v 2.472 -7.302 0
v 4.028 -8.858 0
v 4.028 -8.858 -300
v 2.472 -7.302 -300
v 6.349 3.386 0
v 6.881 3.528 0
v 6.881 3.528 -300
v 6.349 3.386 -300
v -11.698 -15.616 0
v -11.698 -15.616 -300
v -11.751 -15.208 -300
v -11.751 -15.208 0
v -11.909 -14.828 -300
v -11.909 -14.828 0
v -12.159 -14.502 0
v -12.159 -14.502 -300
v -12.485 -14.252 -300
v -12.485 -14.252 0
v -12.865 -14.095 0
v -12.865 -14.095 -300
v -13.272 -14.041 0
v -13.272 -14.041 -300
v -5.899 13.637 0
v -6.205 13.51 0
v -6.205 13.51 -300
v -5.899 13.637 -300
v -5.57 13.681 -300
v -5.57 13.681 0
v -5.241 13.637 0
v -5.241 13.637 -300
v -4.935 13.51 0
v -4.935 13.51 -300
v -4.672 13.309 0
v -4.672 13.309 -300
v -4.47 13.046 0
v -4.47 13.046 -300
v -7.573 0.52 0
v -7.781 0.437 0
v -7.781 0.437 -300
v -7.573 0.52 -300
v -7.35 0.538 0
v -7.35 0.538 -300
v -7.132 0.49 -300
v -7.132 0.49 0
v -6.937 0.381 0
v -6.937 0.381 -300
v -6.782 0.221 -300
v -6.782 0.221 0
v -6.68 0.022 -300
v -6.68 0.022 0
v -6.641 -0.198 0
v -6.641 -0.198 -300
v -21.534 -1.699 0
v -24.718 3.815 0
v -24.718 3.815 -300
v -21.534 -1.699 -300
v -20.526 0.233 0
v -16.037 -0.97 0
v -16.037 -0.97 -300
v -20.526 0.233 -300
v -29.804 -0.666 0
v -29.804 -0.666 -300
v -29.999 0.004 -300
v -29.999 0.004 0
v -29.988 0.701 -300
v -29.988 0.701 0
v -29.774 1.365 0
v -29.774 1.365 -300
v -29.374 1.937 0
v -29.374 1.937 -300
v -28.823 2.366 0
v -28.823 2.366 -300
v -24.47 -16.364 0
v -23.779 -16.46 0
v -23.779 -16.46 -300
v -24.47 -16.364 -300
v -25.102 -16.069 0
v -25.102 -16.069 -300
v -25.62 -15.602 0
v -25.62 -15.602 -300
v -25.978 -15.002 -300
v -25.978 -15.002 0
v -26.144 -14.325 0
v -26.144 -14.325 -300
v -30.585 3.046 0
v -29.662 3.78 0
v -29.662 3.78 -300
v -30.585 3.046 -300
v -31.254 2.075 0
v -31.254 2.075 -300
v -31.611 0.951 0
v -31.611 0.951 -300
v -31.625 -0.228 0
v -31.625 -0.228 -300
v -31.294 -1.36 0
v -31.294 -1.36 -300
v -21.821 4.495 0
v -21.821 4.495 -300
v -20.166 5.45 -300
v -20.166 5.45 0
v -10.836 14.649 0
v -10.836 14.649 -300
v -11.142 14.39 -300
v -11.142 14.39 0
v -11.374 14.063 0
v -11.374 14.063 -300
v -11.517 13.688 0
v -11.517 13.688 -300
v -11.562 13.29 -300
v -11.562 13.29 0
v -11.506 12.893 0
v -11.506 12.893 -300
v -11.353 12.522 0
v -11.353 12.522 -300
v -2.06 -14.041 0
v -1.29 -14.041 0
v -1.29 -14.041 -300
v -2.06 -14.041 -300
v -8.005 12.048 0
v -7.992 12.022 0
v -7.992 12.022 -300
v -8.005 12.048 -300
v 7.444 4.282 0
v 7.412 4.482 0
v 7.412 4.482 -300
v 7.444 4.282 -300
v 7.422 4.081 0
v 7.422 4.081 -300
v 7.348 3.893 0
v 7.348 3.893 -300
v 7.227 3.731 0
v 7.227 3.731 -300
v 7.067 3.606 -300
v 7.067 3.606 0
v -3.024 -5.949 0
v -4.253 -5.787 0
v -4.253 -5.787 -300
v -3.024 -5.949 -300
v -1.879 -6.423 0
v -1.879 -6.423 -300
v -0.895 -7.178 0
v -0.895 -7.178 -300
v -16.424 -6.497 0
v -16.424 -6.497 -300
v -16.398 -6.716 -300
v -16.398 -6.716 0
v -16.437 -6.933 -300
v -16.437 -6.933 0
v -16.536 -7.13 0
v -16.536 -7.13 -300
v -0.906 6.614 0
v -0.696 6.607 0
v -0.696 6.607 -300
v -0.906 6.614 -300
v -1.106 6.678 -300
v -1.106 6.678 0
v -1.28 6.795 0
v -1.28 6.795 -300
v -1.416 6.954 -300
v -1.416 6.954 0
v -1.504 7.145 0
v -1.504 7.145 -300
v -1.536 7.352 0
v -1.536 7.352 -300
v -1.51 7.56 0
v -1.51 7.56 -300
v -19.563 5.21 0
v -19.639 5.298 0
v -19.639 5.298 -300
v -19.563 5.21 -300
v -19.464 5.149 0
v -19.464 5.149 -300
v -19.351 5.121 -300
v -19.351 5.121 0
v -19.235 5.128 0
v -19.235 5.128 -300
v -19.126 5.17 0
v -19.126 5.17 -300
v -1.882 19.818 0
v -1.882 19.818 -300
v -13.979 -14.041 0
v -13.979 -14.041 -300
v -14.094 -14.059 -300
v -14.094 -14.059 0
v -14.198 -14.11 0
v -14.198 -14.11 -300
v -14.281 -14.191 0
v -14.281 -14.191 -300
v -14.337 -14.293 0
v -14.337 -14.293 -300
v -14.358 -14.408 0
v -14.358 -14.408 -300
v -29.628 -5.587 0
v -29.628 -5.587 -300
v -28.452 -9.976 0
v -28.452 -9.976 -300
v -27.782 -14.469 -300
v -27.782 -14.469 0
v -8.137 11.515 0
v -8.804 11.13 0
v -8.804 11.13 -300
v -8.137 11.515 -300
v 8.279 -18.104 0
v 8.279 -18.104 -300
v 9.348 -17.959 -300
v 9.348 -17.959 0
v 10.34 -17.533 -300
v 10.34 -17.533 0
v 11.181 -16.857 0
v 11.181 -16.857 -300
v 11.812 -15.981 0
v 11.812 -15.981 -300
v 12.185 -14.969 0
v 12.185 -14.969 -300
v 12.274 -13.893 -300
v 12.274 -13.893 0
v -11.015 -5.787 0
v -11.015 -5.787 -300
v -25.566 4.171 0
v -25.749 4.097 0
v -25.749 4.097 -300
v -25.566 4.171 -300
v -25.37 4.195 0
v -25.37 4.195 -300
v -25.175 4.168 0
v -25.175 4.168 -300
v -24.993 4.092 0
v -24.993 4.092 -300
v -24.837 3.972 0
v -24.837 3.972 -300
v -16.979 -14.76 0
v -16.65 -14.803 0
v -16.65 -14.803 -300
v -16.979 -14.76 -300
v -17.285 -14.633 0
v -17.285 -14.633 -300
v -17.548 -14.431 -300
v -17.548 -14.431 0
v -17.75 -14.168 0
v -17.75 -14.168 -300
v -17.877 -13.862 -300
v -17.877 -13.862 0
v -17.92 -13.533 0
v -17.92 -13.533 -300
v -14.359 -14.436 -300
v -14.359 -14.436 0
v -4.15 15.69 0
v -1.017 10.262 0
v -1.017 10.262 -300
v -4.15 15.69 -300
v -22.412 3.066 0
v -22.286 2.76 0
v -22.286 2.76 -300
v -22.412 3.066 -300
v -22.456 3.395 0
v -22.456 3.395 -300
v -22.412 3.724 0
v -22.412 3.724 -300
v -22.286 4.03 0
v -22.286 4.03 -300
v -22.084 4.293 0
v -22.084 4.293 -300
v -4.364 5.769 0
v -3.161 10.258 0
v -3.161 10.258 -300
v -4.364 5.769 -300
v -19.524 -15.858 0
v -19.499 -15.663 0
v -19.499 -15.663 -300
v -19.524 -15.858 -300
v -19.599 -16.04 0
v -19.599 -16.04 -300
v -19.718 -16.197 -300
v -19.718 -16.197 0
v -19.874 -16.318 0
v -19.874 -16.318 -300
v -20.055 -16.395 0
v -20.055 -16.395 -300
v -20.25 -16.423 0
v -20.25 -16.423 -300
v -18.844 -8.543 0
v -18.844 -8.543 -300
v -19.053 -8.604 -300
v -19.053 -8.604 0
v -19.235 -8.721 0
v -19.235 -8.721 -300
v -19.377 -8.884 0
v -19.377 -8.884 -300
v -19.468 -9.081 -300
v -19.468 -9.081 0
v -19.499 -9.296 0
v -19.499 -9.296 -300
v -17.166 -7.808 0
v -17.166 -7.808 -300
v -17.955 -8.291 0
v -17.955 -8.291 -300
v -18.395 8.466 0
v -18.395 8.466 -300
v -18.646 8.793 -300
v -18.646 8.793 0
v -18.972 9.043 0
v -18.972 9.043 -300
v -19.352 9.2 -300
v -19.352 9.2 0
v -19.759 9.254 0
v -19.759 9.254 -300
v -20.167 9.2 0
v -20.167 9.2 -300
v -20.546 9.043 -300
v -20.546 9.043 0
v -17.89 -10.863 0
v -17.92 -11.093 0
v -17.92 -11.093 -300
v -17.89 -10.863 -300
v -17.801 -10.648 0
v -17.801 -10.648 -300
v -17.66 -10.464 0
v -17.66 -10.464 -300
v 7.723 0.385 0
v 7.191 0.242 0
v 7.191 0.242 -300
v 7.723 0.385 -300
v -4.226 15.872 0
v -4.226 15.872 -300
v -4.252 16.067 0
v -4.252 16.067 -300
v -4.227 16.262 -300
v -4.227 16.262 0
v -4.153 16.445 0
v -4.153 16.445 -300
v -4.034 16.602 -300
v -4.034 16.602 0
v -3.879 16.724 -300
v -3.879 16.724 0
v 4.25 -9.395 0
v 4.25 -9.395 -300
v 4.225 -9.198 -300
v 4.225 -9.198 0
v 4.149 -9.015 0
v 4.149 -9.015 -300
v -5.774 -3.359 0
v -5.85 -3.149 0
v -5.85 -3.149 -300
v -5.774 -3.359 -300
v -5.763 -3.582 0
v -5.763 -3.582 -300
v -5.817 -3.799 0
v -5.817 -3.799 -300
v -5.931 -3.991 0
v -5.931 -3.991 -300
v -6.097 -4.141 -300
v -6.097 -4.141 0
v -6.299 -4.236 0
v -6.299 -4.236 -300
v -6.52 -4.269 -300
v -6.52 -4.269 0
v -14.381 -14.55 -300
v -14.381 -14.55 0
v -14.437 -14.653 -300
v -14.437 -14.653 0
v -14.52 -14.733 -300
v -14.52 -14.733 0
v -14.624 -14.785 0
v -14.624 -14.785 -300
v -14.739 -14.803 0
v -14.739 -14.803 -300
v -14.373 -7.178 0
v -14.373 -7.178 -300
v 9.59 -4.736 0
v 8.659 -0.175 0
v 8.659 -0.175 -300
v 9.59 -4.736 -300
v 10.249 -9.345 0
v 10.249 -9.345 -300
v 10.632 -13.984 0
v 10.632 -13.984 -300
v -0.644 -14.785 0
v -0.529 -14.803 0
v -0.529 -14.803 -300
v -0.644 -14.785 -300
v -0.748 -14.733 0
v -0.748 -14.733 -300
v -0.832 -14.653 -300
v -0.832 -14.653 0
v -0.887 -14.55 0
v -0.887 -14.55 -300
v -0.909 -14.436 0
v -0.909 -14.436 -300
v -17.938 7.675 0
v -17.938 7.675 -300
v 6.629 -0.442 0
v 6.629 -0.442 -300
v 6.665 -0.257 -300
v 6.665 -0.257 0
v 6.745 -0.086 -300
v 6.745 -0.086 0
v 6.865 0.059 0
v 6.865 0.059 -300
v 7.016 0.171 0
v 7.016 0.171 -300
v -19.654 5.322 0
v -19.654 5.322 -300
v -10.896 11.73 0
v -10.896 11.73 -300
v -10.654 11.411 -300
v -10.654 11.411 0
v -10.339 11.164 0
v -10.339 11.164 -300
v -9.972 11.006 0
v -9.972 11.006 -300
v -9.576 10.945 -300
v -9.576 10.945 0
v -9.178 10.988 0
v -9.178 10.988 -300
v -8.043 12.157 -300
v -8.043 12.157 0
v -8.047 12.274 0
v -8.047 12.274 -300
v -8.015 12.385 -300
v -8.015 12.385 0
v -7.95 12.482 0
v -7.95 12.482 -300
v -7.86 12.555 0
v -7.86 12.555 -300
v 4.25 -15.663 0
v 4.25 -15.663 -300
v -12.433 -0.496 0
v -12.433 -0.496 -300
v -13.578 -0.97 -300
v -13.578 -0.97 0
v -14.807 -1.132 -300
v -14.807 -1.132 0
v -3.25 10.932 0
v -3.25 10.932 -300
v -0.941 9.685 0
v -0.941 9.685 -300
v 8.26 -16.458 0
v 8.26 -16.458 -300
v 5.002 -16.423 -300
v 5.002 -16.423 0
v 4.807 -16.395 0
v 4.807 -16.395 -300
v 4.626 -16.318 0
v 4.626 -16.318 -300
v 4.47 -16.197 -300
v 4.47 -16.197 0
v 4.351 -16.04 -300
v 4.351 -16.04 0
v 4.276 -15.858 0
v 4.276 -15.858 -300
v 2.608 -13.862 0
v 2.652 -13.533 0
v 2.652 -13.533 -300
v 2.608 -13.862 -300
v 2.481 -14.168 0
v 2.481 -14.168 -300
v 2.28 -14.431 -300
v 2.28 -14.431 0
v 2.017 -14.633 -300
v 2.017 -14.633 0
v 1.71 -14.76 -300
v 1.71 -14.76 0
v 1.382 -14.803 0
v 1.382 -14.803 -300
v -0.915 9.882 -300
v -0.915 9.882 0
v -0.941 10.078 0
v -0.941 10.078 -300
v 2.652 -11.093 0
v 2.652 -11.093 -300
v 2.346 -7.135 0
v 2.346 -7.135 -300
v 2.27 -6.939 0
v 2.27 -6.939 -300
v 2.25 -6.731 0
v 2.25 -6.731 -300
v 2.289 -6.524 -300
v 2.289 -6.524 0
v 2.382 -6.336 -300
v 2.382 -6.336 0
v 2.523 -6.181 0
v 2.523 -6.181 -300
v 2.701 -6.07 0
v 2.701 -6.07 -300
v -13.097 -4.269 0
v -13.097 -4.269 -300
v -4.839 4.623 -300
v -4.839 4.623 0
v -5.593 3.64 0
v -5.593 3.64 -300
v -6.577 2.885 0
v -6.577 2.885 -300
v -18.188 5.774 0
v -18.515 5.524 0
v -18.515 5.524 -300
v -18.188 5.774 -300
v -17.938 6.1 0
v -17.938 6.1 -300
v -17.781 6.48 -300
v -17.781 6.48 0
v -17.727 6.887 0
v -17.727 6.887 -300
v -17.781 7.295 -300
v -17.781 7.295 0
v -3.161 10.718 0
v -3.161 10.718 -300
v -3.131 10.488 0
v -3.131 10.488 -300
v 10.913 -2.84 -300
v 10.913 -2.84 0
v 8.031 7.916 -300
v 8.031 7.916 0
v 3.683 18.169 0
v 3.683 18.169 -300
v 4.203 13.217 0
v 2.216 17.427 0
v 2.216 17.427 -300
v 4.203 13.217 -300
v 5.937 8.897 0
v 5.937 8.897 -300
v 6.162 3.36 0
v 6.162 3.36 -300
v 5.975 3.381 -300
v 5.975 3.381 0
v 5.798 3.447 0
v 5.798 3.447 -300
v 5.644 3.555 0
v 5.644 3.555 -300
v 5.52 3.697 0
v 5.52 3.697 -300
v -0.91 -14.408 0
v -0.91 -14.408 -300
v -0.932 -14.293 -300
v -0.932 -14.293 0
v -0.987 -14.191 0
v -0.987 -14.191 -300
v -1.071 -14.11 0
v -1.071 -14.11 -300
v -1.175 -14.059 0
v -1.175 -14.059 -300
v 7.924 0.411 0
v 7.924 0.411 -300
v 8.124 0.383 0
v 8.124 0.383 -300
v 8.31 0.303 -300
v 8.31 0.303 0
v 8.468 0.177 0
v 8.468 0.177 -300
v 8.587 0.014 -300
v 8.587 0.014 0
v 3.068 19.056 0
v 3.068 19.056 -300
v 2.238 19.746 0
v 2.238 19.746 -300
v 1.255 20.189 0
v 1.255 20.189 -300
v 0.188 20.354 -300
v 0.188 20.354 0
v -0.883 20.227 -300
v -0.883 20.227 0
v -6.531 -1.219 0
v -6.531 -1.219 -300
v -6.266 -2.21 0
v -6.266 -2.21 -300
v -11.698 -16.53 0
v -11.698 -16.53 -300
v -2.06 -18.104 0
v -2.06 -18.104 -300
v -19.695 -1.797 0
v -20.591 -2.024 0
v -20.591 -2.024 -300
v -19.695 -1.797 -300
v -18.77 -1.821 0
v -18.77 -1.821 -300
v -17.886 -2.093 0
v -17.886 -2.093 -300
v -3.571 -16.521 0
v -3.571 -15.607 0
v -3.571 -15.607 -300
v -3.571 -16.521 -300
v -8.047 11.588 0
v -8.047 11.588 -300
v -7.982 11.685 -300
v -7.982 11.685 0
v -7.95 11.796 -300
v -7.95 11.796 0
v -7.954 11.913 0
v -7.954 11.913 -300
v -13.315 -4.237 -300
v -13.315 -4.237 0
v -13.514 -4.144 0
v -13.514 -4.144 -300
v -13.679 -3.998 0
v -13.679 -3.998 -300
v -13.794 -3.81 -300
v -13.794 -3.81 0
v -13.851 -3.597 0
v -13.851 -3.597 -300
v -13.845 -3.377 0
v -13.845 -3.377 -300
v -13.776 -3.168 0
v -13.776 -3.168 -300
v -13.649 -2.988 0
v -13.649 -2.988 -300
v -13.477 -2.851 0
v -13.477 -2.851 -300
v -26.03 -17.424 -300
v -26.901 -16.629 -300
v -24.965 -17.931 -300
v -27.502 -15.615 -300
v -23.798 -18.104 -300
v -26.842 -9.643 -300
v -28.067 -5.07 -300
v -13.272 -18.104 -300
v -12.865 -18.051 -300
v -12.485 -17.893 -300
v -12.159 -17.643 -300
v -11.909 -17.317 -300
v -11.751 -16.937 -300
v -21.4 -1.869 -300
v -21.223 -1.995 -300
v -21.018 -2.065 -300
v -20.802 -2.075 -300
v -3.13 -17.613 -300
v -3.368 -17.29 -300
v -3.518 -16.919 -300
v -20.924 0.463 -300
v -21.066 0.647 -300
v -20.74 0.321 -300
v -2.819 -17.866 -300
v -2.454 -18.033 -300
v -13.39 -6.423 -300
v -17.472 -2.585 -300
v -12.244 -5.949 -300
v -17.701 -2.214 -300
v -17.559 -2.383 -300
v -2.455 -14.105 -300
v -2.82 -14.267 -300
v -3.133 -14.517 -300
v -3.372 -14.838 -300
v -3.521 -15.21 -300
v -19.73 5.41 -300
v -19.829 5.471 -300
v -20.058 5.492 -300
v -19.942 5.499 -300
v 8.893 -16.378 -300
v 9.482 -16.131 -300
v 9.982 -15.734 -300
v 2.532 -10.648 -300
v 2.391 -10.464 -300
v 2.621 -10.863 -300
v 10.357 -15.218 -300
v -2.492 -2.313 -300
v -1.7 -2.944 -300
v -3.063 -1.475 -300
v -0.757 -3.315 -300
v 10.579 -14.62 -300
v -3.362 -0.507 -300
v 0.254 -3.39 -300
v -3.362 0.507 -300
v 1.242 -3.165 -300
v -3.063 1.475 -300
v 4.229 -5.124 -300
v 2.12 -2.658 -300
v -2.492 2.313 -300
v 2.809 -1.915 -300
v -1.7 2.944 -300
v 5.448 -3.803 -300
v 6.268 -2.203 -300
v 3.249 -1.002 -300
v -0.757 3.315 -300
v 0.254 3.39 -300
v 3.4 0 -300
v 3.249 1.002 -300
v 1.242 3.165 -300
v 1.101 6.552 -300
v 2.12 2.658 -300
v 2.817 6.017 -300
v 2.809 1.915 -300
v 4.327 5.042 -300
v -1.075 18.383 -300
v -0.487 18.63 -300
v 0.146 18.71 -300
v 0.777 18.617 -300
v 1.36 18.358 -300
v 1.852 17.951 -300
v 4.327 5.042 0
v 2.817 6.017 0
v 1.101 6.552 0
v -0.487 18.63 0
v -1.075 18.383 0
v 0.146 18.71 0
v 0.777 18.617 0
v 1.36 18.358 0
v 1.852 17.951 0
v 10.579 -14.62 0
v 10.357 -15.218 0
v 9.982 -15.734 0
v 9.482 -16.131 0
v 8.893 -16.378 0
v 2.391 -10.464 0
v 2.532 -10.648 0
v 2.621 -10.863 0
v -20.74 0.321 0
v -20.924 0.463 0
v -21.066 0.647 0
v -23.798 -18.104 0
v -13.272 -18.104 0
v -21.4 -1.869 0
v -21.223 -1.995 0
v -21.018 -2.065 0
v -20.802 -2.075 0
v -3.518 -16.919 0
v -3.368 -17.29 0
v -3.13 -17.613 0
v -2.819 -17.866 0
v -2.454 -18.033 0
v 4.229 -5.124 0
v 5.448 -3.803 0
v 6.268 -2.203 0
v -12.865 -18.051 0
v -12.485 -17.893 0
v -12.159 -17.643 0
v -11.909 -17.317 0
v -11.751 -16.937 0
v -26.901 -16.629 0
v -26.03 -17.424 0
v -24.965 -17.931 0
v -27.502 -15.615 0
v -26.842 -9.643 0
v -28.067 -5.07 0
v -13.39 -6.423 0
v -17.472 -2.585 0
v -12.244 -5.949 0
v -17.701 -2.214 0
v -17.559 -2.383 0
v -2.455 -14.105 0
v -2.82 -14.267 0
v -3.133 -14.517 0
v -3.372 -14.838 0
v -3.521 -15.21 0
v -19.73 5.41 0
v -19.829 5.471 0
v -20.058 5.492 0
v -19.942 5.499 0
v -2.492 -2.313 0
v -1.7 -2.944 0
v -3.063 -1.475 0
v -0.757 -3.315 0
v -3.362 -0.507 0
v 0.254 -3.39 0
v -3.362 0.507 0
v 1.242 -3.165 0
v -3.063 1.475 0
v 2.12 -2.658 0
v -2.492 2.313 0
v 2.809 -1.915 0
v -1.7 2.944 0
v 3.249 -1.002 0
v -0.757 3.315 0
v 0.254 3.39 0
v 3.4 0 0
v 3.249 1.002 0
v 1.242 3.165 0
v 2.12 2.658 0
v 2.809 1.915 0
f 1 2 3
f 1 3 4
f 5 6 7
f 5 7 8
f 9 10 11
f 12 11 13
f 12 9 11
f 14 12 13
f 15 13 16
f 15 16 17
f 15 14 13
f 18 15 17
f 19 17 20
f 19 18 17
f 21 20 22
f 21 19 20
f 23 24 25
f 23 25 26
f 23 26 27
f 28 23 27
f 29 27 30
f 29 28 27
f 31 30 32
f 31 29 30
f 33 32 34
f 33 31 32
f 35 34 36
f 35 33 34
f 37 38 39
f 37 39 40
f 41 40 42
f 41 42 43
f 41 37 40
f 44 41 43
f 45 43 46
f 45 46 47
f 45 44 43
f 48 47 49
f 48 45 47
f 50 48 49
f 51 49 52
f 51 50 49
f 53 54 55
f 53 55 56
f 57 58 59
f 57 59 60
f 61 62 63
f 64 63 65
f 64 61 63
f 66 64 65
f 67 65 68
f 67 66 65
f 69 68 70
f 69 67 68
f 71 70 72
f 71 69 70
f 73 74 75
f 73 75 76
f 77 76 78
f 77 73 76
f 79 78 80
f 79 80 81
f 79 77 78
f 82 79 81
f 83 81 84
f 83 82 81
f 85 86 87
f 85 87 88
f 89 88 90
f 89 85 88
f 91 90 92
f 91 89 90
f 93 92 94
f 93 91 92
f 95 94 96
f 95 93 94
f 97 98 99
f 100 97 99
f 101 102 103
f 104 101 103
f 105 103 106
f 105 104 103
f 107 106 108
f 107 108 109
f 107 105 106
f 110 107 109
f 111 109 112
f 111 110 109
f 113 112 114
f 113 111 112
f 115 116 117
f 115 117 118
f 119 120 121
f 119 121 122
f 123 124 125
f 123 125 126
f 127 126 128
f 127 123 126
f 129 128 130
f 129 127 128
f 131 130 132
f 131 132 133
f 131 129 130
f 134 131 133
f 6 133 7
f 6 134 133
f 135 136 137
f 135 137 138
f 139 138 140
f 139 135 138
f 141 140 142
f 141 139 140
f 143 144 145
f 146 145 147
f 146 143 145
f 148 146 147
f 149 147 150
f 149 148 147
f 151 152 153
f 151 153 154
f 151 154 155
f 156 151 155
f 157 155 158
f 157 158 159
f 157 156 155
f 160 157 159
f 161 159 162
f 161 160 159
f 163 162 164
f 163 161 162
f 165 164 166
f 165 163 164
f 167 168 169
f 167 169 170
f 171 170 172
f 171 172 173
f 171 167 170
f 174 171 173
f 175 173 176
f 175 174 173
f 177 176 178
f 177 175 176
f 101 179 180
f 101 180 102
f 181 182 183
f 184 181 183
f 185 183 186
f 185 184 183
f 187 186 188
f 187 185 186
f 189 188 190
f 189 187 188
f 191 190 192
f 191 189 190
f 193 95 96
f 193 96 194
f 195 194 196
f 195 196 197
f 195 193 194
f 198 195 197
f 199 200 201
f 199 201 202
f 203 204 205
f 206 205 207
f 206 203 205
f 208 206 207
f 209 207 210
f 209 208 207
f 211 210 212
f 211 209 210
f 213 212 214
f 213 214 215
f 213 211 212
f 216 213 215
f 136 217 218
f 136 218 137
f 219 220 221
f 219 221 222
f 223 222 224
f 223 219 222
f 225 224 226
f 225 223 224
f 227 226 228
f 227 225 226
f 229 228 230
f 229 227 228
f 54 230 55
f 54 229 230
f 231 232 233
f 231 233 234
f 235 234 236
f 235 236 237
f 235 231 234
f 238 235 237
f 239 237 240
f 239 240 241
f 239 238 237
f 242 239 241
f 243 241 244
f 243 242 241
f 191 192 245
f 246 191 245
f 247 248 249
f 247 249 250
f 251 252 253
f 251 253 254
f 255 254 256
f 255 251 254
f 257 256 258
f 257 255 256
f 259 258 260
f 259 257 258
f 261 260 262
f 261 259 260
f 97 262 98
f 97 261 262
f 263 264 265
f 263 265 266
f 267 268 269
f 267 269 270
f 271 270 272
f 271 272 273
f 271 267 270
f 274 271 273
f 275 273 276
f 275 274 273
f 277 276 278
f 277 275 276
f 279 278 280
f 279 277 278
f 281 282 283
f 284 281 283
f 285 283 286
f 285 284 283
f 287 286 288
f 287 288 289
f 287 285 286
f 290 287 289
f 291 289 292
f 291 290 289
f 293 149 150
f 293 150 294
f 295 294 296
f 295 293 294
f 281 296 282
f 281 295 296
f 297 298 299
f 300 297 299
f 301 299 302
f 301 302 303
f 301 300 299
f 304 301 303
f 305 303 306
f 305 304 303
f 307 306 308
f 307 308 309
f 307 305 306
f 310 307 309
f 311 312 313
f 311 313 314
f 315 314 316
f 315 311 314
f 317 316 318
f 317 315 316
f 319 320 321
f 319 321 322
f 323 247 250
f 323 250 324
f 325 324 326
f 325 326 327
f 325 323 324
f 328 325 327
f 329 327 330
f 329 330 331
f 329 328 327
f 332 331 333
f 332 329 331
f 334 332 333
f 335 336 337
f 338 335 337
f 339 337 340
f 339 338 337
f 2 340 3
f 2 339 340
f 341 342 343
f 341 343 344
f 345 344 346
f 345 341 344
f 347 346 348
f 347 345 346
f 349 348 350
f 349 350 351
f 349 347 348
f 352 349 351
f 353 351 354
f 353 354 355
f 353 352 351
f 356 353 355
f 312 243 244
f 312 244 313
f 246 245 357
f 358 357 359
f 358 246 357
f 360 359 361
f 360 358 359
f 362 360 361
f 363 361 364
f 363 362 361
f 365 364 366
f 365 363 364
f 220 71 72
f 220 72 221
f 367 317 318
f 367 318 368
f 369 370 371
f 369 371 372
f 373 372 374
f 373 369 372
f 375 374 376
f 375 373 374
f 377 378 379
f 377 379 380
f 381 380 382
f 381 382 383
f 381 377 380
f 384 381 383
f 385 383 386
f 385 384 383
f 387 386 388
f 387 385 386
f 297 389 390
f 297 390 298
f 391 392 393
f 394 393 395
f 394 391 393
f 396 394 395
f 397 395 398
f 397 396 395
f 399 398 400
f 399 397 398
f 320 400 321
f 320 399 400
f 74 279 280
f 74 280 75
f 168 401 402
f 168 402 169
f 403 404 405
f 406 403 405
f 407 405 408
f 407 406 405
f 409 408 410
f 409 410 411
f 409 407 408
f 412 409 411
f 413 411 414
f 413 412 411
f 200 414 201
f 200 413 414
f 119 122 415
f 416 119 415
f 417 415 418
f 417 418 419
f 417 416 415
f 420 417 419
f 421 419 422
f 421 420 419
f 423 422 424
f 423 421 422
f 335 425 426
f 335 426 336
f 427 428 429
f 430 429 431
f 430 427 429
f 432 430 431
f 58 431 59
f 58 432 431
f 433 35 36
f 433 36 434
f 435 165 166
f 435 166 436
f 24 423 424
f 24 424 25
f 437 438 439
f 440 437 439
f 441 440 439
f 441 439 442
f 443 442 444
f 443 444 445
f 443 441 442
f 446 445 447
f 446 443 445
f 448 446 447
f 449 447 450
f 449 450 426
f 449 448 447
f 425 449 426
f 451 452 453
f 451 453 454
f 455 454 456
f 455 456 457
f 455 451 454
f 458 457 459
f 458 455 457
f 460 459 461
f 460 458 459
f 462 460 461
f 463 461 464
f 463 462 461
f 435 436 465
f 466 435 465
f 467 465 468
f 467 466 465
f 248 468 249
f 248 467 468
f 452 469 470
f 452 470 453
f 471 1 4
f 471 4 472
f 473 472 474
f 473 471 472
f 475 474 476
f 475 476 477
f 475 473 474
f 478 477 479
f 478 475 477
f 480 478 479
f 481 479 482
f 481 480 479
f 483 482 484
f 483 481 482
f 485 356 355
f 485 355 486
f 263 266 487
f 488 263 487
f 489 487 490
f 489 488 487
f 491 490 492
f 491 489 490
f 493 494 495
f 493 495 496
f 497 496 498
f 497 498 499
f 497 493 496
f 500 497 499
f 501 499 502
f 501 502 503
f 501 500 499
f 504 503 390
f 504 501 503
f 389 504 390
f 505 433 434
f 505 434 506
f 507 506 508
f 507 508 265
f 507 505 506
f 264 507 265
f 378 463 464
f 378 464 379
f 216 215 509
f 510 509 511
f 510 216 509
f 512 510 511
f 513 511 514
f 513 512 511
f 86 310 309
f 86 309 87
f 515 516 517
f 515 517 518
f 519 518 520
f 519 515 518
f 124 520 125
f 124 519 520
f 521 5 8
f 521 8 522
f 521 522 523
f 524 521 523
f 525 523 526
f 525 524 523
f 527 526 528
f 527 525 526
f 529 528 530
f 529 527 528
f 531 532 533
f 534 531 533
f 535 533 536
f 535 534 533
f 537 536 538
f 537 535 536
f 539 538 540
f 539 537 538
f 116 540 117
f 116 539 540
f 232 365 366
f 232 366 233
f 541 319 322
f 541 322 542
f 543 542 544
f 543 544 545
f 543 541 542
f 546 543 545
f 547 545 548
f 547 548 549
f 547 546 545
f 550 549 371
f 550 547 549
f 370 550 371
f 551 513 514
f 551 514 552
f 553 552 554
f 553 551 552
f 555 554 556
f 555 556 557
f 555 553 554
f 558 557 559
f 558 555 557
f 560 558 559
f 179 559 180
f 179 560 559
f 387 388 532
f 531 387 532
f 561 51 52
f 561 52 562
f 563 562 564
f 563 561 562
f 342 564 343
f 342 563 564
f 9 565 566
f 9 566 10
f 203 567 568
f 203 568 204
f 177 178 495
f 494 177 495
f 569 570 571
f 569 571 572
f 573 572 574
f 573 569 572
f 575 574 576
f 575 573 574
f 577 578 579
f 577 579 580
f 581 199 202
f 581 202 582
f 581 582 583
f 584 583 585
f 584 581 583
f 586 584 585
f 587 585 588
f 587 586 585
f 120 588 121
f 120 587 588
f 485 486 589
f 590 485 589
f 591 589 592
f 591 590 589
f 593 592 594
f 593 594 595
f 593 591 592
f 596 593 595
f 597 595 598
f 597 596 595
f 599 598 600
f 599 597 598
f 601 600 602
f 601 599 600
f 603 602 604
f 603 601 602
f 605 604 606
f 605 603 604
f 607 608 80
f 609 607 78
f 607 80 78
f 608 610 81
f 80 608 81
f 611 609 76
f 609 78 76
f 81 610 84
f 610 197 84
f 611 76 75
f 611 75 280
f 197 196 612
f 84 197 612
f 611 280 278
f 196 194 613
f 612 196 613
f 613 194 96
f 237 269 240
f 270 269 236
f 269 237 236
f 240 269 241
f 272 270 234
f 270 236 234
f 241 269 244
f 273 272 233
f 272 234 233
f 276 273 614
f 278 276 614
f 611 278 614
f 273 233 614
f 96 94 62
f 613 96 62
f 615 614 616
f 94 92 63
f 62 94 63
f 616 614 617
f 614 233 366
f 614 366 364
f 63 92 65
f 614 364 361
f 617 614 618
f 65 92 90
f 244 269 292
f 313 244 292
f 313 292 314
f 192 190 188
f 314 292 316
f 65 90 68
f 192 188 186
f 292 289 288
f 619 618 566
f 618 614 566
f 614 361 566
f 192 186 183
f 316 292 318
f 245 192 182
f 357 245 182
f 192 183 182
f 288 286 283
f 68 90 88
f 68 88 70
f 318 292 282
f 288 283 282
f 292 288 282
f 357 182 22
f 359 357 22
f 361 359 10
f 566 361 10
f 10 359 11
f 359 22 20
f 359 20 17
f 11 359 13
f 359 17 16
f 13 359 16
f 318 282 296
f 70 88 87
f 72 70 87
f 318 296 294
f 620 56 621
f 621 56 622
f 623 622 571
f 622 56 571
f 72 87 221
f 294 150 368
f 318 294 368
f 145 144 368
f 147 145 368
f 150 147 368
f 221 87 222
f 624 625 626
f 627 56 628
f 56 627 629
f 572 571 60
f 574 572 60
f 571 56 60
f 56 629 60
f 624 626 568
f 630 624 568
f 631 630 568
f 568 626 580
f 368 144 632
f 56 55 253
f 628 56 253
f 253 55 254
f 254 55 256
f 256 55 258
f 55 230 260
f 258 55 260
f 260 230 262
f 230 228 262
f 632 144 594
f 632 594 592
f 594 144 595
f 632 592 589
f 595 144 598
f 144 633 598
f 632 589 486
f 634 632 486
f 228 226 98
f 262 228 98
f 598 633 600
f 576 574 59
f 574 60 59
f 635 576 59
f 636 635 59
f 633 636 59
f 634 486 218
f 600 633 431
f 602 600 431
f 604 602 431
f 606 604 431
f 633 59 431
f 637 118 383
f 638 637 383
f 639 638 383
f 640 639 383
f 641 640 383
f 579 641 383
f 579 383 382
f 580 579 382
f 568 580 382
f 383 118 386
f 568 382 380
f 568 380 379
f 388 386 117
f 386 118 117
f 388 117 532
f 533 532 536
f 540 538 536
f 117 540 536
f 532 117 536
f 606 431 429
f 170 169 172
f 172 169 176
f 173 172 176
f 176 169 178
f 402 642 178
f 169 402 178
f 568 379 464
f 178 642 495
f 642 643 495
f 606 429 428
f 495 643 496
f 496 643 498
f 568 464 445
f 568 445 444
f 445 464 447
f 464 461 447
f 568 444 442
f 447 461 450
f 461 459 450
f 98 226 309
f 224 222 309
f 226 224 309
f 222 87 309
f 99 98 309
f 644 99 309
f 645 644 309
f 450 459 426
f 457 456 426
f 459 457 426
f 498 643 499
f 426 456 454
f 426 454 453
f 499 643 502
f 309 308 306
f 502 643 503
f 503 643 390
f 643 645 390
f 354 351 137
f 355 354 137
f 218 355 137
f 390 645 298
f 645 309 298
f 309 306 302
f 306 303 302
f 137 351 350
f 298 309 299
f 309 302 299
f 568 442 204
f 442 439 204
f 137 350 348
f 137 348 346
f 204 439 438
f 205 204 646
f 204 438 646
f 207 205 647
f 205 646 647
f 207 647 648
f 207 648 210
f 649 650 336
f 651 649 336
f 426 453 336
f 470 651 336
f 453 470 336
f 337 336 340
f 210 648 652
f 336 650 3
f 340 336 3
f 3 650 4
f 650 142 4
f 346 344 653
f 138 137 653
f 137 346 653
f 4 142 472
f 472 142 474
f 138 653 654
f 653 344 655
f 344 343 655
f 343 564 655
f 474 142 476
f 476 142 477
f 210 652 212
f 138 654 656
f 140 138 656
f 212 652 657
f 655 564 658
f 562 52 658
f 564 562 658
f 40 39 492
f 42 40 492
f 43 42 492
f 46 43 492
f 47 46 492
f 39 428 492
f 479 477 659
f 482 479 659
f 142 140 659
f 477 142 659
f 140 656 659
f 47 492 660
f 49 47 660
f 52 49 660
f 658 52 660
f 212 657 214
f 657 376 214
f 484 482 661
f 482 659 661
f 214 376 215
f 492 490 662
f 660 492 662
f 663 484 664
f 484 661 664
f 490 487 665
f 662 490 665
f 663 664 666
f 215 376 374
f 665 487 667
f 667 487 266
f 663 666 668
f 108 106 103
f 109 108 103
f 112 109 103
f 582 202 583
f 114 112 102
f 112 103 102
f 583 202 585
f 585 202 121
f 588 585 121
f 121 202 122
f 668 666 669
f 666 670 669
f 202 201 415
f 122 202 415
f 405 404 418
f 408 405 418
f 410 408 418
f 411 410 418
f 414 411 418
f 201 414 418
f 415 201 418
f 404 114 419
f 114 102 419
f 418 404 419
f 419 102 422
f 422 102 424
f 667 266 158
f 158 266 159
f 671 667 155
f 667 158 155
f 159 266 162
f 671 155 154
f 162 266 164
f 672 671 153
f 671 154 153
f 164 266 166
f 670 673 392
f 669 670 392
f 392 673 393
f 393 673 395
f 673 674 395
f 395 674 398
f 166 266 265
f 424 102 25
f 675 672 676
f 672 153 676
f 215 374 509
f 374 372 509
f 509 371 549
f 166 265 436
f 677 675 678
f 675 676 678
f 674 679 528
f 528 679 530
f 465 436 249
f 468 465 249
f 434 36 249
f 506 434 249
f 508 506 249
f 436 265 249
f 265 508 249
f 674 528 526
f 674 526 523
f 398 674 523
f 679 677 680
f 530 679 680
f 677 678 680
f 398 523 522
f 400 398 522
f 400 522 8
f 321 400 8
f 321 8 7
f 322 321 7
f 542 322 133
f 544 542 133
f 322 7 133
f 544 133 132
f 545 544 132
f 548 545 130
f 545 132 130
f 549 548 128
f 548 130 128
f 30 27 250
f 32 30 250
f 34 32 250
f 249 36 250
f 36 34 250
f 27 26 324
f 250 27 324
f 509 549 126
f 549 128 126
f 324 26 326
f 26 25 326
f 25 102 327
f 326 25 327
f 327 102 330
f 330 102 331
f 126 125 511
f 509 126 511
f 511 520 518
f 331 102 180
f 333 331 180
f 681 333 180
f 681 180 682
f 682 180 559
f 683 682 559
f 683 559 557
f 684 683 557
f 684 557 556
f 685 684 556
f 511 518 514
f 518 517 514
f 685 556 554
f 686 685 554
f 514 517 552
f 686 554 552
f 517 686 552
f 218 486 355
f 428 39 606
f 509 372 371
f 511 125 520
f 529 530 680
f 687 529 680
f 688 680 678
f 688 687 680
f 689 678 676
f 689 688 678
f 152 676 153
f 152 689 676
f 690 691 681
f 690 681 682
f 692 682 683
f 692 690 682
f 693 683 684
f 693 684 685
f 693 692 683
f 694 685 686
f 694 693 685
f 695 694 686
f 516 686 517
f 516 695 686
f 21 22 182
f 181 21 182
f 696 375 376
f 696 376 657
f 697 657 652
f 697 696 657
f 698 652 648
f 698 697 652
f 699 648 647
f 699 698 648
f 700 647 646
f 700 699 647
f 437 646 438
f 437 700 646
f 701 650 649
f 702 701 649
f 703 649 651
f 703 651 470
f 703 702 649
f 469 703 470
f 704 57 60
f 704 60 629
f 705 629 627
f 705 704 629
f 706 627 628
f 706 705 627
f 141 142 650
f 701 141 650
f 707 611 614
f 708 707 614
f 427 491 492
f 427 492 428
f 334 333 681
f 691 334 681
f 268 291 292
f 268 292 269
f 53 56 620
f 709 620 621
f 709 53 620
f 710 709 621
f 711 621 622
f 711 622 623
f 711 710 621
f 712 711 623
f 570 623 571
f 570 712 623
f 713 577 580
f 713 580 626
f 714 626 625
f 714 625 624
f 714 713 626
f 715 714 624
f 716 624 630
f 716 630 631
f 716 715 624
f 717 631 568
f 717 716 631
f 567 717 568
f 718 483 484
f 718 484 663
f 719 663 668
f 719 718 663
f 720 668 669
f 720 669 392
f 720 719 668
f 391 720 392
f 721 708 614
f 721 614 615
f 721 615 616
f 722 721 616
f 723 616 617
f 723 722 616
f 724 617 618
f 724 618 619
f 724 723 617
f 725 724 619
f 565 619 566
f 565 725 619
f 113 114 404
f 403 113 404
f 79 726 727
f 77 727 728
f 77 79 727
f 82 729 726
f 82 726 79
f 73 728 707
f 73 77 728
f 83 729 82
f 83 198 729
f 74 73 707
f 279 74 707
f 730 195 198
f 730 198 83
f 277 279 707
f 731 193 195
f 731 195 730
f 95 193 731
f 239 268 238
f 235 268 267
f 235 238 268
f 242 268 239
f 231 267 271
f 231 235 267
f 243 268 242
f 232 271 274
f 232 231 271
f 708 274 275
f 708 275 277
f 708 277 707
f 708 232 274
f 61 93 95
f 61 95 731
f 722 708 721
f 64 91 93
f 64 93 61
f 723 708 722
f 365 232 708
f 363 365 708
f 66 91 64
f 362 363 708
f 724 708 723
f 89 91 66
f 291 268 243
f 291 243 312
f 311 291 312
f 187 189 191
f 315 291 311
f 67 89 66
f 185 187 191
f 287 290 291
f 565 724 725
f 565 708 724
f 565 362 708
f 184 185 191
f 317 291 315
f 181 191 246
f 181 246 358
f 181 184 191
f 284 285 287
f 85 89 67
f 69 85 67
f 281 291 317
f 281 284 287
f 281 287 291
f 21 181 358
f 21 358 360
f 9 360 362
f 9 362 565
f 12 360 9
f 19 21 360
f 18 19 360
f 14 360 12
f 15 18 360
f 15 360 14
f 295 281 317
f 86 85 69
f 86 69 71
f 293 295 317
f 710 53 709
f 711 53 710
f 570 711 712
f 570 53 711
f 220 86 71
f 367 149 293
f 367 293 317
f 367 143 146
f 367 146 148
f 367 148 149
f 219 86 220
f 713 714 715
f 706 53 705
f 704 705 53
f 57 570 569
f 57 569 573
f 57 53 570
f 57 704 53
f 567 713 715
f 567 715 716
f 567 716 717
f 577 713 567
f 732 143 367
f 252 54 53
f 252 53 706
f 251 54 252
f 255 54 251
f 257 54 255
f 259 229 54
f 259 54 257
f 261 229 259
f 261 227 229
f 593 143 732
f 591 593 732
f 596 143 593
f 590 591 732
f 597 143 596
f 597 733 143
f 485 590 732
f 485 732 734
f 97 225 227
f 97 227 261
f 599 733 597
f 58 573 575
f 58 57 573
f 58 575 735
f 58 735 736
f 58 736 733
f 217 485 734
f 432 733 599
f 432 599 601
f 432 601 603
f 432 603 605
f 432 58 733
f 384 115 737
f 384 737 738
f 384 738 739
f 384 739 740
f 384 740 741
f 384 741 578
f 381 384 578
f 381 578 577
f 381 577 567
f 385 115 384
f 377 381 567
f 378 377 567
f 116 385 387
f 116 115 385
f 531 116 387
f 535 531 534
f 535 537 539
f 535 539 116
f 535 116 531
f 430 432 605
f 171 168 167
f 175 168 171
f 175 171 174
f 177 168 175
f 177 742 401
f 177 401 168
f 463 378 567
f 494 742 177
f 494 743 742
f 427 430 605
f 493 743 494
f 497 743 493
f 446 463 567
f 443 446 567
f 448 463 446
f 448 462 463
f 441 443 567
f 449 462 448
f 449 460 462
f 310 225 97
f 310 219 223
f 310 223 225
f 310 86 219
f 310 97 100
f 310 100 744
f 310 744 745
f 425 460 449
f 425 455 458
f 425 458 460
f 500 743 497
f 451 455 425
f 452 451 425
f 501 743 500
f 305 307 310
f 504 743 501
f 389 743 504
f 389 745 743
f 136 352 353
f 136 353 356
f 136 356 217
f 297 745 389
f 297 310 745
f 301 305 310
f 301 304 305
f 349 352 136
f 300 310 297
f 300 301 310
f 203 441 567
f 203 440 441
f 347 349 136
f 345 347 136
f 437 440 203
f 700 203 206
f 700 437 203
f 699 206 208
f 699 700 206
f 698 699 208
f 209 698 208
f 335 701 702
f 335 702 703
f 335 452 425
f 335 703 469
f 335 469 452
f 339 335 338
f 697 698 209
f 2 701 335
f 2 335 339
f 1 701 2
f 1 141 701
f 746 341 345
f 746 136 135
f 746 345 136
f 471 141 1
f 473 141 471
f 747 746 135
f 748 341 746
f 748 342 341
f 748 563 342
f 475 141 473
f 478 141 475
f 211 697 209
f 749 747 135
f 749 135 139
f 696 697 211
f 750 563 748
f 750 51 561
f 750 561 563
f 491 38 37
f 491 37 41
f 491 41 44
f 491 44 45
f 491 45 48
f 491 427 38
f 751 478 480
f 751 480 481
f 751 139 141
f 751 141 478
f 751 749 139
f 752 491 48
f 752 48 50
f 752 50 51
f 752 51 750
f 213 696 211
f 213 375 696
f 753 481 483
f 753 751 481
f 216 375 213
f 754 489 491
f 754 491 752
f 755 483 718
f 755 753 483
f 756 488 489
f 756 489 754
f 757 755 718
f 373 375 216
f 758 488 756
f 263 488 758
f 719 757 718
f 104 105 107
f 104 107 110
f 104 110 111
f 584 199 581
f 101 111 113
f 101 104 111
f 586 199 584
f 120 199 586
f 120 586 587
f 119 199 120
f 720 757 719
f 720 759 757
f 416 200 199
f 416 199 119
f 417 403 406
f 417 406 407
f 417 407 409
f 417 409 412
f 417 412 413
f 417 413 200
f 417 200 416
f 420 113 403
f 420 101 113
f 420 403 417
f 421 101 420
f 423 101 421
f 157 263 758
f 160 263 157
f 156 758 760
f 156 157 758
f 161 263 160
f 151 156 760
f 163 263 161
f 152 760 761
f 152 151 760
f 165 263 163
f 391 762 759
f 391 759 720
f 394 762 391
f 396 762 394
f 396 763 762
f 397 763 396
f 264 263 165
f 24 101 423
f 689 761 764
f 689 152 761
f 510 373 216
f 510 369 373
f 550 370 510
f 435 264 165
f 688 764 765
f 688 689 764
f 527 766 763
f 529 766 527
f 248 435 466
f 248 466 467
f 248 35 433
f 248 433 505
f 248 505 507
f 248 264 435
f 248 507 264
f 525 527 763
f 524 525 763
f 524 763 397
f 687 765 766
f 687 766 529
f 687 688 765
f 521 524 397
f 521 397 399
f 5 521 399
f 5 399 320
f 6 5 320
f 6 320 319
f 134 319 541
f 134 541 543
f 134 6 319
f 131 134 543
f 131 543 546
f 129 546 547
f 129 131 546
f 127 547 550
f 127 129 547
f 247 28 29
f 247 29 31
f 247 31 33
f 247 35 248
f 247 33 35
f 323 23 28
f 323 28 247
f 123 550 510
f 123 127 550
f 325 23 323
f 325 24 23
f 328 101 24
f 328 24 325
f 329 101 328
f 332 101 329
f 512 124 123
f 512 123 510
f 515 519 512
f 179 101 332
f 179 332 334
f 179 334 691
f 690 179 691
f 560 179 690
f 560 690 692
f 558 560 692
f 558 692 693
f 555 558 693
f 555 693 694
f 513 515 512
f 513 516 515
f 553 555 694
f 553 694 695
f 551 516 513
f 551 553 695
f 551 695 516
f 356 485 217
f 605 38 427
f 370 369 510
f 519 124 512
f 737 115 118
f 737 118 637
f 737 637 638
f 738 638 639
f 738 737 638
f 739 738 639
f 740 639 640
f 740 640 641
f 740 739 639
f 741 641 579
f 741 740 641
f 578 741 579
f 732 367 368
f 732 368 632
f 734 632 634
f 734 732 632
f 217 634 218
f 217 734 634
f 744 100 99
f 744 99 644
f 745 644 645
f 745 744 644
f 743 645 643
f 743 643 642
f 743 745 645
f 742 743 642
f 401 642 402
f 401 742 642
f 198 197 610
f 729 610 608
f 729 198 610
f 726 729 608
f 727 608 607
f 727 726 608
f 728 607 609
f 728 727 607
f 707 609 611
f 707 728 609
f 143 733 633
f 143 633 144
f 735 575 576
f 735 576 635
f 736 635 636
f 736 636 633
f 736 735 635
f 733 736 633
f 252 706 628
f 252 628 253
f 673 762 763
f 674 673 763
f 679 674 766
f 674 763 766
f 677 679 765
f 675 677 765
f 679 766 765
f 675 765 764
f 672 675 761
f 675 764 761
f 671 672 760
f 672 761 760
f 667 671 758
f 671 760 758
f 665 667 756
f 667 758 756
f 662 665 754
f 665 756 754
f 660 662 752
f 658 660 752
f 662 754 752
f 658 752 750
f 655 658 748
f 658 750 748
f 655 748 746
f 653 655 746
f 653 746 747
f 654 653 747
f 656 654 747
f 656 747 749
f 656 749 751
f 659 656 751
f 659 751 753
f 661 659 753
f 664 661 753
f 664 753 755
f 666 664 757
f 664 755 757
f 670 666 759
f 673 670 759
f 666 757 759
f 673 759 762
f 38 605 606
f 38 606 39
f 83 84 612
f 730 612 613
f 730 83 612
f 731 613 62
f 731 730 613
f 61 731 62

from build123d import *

# Parameters (mm, degrees)
SKETCH1_R      = 3.399999999
EXTRUDE1_DEPTH = 300


with BuildPart() as part:
    # Sketch1 → Extrude1 (new body)
    with BuildSketch(Plane.XY):
        with BuildLine():
            Line((-2.059593866, -18.104416256), (8.279174121, -18.104416256))
            ThreePointArc((8.279174121, -18.104416256), (11.181313383, -16.857158108), (12.273594224, -13.893210106))
            ThreePointArc((12.273594224, -13.893210106), (9.65925826, 2.588190449), (3.682639337, 18.16867))
            ThreePointArc((3.682639337, 18.16867), (1.25472238, 20.189383847), (-1.882233023, 19.818471458))
            Line((-1.882233023, 19.818471458), (-10.835868733, 14.649087471))
            ThreePointArc((-10.835868733, 14.649087471), (-11.517306455, 13.688428826), (-11.352775107, 12.522173349))
            Line((-11.352775107, 12.522173349), (-10.895632574, 11.730379256))
            ThreePointArc((-10.895632574, 11.730379256), (-9.971755302, 11.005610738), (-8.804122697, 11.130000122))
            Line((-8.804122697, 11.130000122), (-8.137309536, 11.51498488))
            ThreePointArc((-8.137309536, 11.51498488), (-7.962051999, 11.739304298), (-7.991807639, 12.022410299))
            Line((-7.991807639, 12.022410299), (-8.005205154, 12.04760736))
            ThreePointArc((-8.005205154, 12.04760736), (-8.034960793, 12.33071336), (-7.859703256, 12.555032779))
            Line((-7.859703256, 12.555032779), (-6.204847981, 13.510463917))
            ThreePointArc((-6.204847981, 13.510463917), (-5.241268241, 13.637321596), (-4.470212547, 13.045669753))
            Line((-4.470212547, 13.045669753), (-3.250166277, 10.932487626))
            ThreePointArc((-3.250166277, 10.932487626), (-3.138682315, 10.604066463), (-3.161365902, 10.257981807))
            Line((-3.161365902, 10.257981807), (-4.364267951, 5.768690249))
            ThreePointArc((-4.364267951, 5.768690249), (-5.183850297, 4.106741659), (-6.577045843, 2.884941957))
            Line((-6.577045843, 2.884941957), (-12.432727244, -0.495837277))
            ThreePointArc((-12.432727244, -0.495837277), (-14.187434599, -1.091480161), (-16.036515473, -0.970284996))
            Line((-16.036515473, -0.970284996), (-20.52580703, 0.232617053))
            ThreePointArc((-20.52580703, 0.232617053), (-20.836866927, 0.386014818), (-21.065546016, 0.646773342))
            Line((-21.065546016, 0.646773342), (-22.285592286, 2.75995547))
            ThreePointArc((-22.285592286, 2.75995547), (-22.412449965, 3.72353521), (-21.820798122, 4.494590904))
            Line((-21.820798122, 4.494590904), (-20.165942847, 5.450022043))
            ThreePointArc((-20.165942847, 5.450022043), (-19.884047763, 5.489639813), (-19.653748594, 5.322317672))
            Line((-19.653748594, 5.322317672), (-19.638626056, 5.298116553))
            ThreePointArc((-19.638626056, 5.298116553), (-19.408326887, 5.130794413), (-19.126431804, 5.170412183))
            Line((-19.126431804, 5.170412183), (-18.514604376, 5.523650914))
            ThreePointArc((-18.514604376, 5.523650914), (-17.78095609, 6.479759973), (-17.938259613, 7.674598851))
            Line((-17.938259613, 7.674598851), (-18.39540247, 8.466393505))
            ThreePointArc((-18.39540247, 8.466393505), (-19.35151153, 9.200041791), (-20.546350407, 9.042738268))
            Line((-20.546350407, 9.042738268), (-29.662040307, 3.779792251))
            ThreePointArc((-29.662040307, 3.779792251), (-31.47445664, 1.526261453), (-31.294110083, -1.360038798))
            ThreePointArc((-31.294110083, -1.360038798), (-28.977774789, -7.764571351), (-27.781513715, -14.469226888))
            ThreePointArc((-27.781513715, -14.469226888), (-26.49454829, -17.059009504), (-23.798184307, -18.104416256))
            Line((-23.798184307, -18.104416256), (-13.272292278, -18.104416256))
            ThreePointArc((-13.272292278, -18.104416256), (-12.158879696, -17.643225664), (-11.697689104, -16.529813082))
            Line((-11.697689104, -16.529813082), (-11.697689104, -15.615527367))
            ThreePointArc((-11.697689104, -15.615527367), (-12.158879696, -14.502114785), (-13.272292278, -14.040924193))
            Line((-13.272292278, -14.040924193), (-13.978769739, -14.040924193))
            ThreePointArc((-13.978769739, -14.040924193), (-14.242706928, -14.147561739), (-14.358490788, -14.407616548))
            Line((-14.358490788, -14.407616548), (-14.35948673, -14.4361366))
            ThreePointArc((-14.35948673, -14.4361366), (-14.475270591, -14.696191409), (-14.739207779, -14.802828955))
            Line((-14.739207779, -14.802828955), (-16.650070056, -14.802828955))
            ThreePointArc((-16.650070056, -14.802828955), (-17.547983429, -14.430901058), (-17.919911326, -13.532987685))
            Line((-17.919911326, -13.532987685), (-17.919911326, -11.092895145))
            ThreePointArc((-17.919911326, -11.092895145), (-17.852248688, -10.752732094), (-17.659561798, -10.464355784))
            Line((-17.659561798, -10.464355784), (-14.373172288, -7.177966273))
            ThreePointArc((-14.373172288, -7.177966273), (-12.83241886, -6.148467746), (-11.014976273, -5.786955939))
            Line((-11.014976273, -5.786955939), (-4.253417808, -5.786955939))
            ThreePointArc((-4.253417808, -5.786955939), (-2.435975221, -6.148467746), (-0.895221793, -7.177966273))
            Line((-0.895221793, -7.177966273), (2.391167718, -10.464355784))
            ThreePointArc((2.391167718, -10.464355784), (2.583854608, -10.752732094), (2.651517245, -11.092895145))
            Line((2.651517245, -11.092895145), (2.651517245, -13.532987685))
            ThreePointArc((2.651517245, -13.532987685), (2.279589349, -14.430901058), (1.381675976, -14.802828955))
            Line((1.381675976, -14.802828955), (-0.529186301, -14.802828955))
            ThreePointArc((-0.529186301, -14.802828955), (-0.79312349, -14.696191409), (-0.90890735, -14.4361366))
            Line((-0.90890735, -14.4361366), (-0.909903292, -14.407616548))
            ThreePointArc((-0.909903292, -14.407616548), (-1.025687153, -14.147561739), (-1.289624342, -14.040924193))
            Line((-1.289624342, -14.040924193), (-2.059593866, -14.040924193))
            ThreePointArc((-2.059593866, -14.040924193), (-3.132988051, -14.517016132), (-3.570704977, -15.606622714))
            Line((-3.570704977, -15.606622714), (-3.570704977, -16.520908428))
            ThreePointArc((-3.570704977, -16.520908428), (-3.130065344, -17.61318056), (-2.059593866, -18.104416256))
        make_face()
        with Locations((3.2e-08, -5.5e-08)):
            Circle(SKETCH1_R, mode=Mode.SUBTRACT)
        with BuildLine():
            Line((-17.471996997, -2.585491548), (-16.423939067, -6.496897212))
            ThreePointArc((-16.423939067, -6.496897212), (-16.409679865, -6.826087675), (-16.53608811, -7.130374779))
            ThreePointArc((-16.53608811, -7.130374779), (-17.543650961, -8.076355418), (-18.844475383, -8.543172397))
            ThreePointArc((-18.844475383, -8.543172397), (-19.312155652, -8.797217087), (-19.498513244, -9.29574932))
            Line((-19.498513244, -9.29574932), (-19.498513244, -15.662799546))
            ThreePointArc((-19.498513244, -15.662799546), (-19.718246677, -16.197319926), (-20.250387025, -16.4227561))
            Line((-20.250387025, -16.4227561), (-23.778549311, -16.460482754))
            ThreePointArc((-23.778549311, -16.460482754), (-25.37859993, -15.854783364), (-26.143910087, -14.324641508))
            ThreePointArc((-26.143910087, -14.324641508), (-27.389825963, -7.33908176), (-29.803611037, -0.666451621))
            ThreePointArc((-29.803611037, -0.666451621), (-29.905903927, 1.041345175), (-28.823069139, 2.365921544))
            Line((-28.823069139, 2.365921544), (-25.748727644, 4.097330446))
            ThreePointArc((-25.748727644, 4.097330446), (-25.175162497, 4.168167167), (-24.717607571, 3.815125655))
            Line((-24.717607571, 3.815125655), (-21.534082474, -1.698901561))
            ThreePointArc((-21.534082474, -1.698901561), (-21.123425948, -2.037464343), (-20.591380608, -2.023633363))
            ThreePointArc((-20.591380608, -2.023633363), (-19.231425073, -1.777496514), (-17.885859686, -2.092958393))
            ThreePointArc((-17.885859686, -2.092958393), (-17.624243388, -2.293274639), (-17.471996997, -2.585491548))
        make_face(mode=Mode.SUBTRACT)
        with BuildLine():
            Line((7.190897434, 0.242092847), (7.722900865, 0.38464274))
            ThreePointArc((7.722900865, 0.38464274), (8.309684208, 0.302794353), (8.659411124, -0.175436695))
            ThreePointArc((8.659411124, -0.175436695), (9.953652351, -7.035721769), (10.632131313, -13.983976078))
            ThreePointArc((10.632131313, -13.983976078), (9.981645181, -15.73436744), (8.260122506, -16.457804934))
            Line((8.260122506, -16.457804934), (5.002311314, -16.422756139))
            ThreePointArc((5.002311314, -16.422756139), (4.47017203, -16.197320416), (4.250439036, -15.662801104))
            Line((4.250439036, -15.662801104), (4.250439036, -9.395167615))
            ThreePointArc((4.250439036, -9.395167615), (4.192587481, -9.104328206), (4.02784019, -8.857766461))
            Line((4.02784019, -8.857766461), (2.472174548, -7.302100819))
            ThreePointArc((2.472174548, -7.302100819), (2.262321312, -6.626096356), (2.700649697, -6.070318845))
            ThreePointArc((2.700649697, -6.070318845), (5.448190239, -3.80256528), (6.629279814, -0.441507013))
            ThreePointArc((6.629279814, -0.441507013), (6.800365527, -0.009563085), (7.190897434, 0.242092847))
        make_face(mode=Mode.SUBTRACT)
        with BuildLine():
            Line((-1.510084411, 7.559891942), (-0.940671266, 9.684970729))
            ThreePointArc((-0.940671266, 9.684970729), (-0.921276799, 9.980873109), (-1.016595587, 10.261673203))
            Line((-1.016595587, 10.261673203), (-4.150412332, 15.689603027))
            ThreePointArc((-4.150412332, 15.689603027), (-4.227383934, 16.262352796), (-3.879292116, 16.723654228))
            Line((-3.879292116, 16.723654228), (-1.075426501, 18.382938276))
            ThreePointArc((-1.075426501, 18.382938276), (0.77717457, 18.617184399), (2.215707781, 17.426544162))
            ThreePointArc((2.215707781, 17.426544162), (5.102254892, 11.069940004), (7.411551633, 4.48163831))
            ThreePointArc((7.411551633, 4.48163831), (7.347794829, 3.892614543), (6.8805497, 3.528340035))
            Line((6.8805497, 3.528340035), (6.348546228, 3.385790132))
            ThreePointArc((6.348546228, 3.385790132), (5.884507712, 3.408464604), (5.520371172, 3.696996155))
            ThreePointArc((5.520371172, 3.696996155), (2.816988485, 6.017213134), (-0.69632814, 6.607375035))
            ThreePointArc((-0.69632814, 6.607375035), (-1.353820412, 6.869528286), (-1.510084411, 7.559891942))
        make_face(mode=Mode.SUBTRACT)
        with BuildLine():
            Line((-6.519522932, -4.269206071), (-13.09653484, -4.269206071))
            ThreePointArc((-13.09653484, -4.269206071), (-13.830638522, -3.705908495), (-13.476534864, -2.851026646))
            Line((-13.476534864, -2.851026646), (-7.780675483, 0.437479301))
            ThreePointArc((-7.780675483, 0.437479301), (-7.030528407, 0.443070393), (-6.641013202, -0.198045665))
            ThreePointArc((-6.641013202, -0.198045665), (-6.417577923, -1.719584898), (-5.850308929, -3.148994163))
            ThreePointArc((-5.850308929, -3.148994163), (-5.867080961, -3.89897456), (-6.519522932, -4.269206071))
        make_face(mode=Mode.SUBTRACT)
    extrude(amount=-EXTRUDE1_DEPTH)


solid = part.part
